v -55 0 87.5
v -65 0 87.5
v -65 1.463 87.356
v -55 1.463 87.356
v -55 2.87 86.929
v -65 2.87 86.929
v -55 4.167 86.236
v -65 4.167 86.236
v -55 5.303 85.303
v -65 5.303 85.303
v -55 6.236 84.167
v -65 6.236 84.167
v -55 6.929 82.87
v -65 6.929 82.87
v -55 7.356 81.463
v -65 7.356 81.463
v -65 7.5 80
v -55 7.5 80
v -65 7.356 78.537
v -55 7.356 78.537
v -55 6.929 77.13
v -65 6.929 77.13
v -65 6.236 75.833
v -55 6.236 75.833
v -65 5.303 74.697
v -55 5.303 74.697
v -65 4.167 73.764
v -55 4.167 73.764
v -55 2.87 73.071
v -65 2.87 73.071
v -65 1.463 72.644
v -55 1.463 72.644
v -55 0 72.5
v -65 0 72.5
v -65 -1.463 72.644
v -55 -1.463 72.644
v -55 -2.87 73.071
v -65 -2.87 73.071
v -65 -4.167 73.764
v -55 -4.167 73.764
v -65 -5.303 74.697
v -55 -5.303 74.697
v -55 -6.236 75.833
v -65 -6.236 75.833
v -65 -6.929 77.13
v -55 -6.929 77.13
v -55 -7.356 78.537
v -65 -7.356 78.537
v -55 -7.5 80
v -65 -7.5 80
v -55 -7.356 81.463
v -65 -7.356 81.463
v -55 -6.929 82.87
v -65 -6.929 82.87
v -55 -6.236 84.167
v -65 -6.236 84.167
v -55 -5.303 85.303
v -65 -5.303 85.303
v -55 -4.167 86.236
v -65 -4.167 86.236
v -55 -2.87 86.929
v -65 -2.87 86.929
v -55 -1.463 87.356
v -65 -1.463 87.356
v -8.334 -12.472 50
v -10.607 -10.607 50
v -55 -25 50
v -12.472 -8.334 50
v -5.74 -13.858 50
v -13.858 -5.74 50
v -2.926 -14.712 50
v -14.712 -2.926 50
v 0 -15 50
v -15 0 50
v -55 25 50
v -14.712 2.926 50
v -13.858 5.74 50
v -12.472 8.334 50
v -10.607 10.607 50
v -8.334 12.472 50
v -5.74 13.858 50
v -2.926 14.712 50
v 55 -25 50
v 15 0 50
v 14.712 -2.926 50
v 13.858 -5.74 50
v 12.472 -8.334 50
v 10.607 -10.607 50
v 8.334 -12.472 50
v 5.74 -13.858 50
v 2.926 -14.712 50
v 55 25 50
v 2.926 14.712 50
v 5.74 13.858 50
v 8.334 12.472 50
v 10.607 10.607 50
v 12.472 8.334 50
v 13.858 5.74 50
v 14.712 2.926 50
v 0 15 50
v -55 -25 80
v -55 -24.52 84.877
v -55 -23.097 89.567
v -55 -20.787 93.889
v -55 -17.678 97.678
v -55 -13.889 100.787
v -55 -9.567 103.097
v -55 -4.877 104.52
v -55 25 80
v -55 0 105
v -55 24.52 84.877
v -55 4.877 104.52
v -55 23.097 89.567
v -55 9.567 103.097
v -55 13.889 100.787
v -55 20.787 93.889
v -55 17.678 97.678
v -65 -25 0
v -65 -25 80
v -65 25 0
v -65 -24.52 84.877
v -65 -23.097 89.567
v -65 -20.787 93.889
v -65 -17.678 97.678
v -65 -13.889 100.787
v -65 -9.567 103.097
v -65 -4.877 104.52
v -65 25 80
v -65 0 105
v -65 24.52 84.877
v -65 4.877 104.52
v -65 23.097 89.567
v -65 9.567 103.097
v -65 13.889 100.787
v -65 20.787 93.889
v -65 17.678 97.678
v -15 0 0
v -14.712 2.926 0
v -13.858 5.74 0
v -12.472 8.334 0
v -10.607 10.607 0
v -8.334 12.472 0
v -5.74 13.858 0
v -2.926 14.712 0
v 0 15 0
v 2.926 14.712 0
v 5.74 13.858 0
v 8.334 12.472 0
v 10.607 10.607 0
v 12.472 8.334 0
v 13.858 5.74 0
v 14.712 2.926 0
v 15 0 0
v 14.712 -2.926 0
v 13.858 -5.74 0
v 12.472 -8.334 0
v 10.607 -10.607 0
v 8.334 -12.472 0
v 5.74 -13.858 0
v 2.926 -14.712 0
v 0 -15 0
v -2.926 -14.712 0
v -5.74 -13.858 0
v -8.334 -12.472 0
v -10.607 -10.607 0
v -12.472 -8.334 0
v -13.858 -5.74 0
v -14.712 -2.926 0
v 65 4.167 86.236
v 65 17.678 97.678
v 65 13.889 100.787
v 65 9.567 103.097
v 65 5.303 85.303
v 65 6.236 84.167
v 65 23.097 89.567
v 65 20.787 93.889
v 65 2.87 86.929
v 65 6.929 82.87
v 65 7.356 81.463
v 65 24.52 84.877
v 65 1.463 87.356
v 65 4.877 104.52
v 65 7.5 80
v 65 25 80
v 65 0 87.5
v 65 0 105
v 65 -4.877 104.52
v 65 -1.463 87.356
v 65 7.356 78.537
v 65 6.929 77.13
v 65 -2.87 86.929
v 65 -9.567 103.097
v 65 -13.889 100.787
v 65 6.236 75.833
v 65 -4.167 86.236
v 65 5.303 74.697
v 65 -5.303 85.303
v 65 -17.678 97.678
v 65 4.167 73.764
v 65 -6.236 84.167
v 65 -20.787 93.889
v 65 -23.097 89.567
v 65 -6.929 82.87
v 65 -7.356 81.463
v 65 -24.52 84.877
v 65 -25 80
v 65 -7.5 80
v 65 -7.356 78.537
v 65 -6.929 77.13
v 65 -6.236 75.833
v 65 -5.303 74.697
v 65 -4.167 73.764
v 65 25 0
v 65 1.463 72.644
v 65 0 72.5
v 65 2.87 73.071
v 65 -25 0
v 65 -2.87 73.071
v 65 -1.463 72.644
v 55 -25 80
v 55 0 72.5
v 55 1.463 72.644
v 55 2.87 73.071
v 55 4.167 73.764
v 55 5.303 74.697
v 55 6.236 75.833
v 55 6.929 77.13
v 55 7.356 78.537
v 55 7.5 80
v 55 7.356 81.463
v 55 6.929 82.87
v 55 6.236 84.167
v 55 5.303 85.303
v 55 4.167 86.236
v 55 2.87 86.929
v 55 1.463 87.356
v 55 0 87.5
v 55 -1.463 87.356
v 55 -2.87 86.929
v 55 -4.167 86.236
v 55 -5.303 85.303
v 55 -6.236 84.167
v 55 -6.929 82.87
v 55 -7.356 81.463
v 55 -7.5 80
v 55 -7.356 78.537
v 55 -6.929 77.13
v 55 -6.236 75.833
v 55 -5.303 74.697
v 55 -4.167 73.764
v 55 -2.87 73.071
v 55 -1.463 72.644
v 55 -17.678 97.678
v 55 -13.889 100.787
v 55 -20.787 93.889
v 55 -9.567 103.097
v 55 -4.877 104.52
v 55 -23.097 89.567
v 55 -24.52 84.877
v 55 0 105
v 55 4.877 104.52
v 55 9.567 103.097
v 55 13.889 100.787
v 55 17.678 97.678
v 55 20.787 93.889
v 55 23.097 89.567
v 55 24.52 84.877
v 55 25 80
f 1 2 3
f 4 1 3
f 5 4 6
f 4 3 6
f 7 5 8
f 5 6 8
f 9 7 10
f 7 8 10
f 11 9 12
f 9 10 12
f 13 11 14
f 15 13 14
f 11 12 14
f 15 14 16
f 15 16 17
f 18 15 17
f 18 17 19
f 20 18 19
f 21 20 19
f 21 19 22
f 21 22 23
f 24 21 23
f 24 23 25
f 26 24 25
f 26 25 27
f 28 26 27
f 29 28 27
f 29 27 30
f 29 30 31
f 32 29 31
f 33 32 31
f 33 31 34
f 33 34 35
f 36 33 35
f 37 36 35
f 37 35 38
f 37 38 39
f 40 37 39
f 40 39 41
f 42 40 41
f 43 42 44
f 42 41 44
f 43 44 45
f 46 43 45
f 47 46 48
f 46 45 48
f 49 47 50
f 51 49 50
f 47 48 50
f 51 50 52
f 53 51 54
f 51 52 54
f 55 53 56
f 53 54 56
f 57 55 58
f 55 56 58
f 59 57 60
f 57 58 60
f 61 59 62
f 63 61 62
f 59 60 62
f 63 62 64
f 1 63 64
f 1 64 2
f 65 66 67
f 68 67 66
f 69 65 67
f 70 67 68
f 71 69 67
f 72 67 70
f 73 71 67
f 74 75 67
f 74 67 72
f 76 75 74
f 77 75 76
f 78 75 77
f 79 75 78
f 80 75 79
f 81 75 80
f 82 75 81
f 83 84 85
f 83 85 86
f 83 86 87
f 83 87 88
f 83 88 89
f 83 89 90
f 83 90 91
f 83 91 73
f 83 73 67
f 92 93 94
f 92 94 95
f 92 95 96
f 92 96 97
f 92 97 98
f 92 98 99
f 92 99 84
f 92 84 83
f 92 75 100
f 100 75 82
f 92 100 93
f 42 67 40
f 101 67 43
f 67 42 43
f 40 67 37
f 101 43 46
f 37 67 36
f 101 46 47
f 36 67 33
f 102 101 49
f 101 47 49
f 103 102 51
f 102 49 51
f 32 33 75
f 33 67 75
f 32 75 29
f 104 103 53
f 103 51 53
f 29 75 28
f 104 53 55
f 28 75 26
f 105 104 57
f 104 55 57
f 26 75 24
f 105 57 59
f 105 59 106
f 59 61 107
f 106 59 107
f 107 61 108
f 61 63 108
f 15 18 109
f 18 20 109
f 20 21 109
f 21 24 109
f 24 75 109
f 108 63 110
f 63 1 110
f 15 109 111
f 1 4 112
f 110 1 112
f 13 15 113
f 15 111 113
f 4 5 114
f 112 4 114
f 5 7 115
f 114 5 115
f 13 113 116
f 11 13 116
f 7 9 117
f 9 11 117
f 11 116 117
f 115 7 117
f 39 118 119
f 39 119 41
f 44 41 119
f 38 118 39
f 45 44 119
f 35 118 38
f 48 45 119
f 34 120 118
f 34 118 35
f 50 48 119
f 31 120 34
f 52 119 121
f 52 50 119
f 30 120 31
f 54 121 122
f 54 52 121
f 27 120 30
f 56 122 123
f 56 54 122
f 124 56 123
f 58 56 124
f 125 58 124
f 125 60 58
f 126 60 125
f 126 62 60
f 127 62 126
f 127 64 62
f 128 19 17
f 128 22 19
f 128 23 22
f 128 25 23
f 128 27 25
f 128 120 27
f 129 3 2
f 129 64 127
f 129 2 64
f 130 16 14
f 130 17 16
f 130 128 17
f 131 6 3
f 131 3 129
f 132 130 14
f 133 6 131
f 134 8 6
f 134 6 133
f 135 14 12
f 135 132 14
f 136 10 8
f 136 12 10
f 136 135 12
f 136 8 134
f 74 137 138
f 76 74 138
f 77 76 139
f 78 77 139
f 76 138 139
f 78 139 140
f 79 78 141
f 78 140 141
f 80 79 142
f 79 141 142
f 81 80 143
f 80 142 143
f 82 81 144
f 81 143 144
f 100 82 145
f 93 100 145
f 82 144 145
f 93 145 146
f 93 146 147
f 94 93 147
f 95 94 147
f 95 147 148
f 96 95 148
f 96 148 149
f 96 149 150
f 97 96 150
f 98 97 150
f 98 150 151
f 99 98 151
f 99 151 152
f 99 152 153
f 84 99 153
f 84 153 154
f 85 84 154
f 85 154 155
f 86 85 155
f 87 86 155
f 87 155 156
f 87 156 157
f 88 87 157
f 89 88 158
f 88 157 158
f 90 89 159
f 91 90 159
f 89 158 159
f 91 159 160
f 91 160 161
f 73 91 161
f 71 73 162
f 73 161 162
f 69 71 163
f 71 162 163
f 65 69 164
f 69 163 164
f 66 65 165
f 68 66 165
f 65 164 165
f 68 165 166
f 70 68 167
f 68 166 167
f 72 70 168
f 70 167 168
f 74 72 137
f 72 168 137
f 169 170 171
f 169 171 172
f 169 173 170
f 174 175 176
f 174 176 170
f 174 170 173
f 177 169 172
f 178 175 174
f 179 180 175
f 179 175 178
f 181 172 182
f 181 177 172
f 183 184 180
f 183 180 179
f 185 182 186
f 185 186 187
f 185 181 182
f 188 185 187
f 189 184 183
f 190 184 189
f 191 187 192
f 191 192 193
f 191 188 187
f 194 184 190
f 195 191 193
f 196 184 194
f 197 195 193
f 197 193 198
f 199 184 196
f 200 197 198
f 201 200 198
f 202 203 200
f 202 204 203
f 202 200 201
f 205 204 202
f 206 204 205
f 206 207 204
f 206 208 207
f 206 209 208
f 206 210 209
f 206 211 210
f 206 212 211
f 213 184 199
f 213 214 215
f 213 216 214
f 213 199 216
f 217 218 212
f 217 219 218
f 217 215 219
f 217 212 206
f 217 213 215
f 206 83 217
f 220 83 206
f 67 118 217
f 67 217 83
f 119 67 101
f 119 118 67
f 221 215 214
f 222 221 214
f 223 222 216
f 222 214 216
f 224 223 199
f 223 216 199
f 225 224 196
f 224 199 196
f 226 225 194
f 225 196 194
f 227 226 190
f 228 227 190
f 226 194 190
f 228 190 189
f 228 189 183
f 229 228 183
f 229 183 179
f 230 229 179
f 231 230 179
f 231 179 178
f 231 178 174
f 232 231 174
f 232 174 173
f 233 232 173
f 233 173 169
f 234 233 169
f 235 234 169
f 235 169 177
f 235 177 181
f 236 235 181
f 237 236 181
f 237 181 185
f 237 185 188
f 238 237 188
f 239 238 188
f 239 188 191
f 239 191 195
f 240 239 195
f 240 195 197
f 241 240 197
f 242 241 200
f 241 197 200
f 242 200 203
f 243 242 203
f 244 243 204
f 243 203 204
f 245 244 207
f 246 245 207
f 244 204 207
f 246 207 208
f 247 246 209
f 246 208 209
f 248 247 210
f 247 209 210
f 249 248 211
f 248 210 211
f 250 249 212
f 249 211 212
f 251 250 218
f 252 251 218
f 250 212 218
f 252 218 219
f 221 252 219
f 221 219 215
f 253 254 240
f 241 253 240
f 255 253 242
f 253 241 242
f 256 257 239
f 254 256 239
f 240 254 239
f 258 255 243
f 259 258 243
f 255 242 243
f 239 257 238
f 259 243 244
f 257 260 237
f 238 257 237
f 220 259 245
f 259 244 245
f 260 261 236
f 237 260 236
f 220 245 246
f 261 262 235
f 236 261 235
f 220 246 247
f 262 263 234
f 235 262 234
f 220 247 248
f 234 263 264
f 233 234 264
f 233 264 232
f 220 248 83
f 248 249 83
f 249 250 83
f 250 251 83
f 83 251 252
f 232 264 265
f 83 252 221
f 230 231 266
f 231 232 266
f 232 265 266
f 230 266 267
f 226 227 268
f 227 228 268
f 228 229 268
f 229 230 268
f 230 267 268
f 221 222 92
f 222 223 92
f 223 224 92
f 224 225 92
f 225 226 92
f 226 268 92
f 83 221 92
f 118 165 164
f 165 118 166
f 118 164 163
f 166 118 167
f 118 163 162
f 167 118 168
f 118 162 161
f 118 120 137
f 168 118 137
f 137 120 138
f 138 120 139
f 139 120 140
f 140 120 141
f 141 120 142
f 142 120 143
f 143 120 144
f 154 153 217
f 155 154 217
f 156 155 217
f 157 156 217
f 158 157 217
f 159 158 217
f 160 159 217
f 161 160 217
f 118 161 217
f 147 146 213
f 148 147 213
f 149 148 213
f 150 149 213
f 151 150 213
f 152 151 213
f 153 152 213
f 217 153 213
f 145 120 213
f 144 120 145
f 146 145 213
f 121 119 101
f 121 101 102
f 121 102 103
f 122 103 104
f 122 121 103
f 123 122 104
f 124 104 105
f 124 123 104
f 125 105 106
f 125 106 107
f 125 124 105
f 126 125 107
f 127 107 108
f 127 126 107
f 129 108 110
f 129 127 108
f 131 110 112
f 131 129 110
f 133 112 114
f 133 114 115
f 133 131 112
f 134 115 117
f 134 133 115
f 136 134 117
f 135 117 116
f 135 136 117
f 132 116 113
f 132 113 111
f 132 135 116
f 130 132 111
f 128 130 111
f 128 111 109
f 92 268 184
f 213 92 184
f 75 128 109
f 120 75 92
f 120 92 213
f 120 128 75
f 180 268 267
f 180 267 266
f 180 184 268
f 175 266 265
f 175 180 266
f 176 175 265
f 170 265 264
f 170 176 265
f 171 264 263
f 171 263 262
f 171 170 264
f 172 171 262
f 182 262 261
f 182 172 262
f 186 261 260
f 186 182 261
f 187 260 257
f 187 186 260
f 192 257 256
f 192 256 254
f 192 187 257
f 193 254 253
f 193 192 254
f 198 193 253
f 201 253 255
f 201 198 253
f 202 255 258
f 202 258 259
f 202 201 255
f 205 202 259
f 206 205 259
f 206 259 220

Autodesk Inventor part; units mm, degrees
ref_plane "YZ Plane" through (0, 0, 0) normal (1, 0, 0) x (0, 1, 0)
ref_plane "XZ Plane" through (0, 0, 0) normal (0, 1, 0) x (-1, 0, 0)
ref_plane "XY Plane" through (0, 0, 0) normal (0, 0, 1) x (1, 0, 0)
sketch "Boceto1" plane through (0, 0, 0) normal (0, 0, 1) x (1, 0, 0)
  line L0 (65, -25) -> (-65, -25)
  line L1 (-65, -25) -> (-65, 25)
  line L2 (-65, 25) -> (65, 25)
  line L3 (65, 25) -> (65, -25)
  line L4 (65, -25) -> (-65, 25) construction
  line L5 (-65, -25) -> (65, 25) construction
  point P0 (0, 0)
  dimension "d0" = 130
  dimension "d1" = 50
extrude "Extrusión1" add sketch "Boceto1" along normal blind 50
sketch "Boceto2" plane through (65, -25, 0) normal (1, 0, 0) x (0, 0, -1)
  line L0 (-50, 0) -> (-80, 0)
  line L1 (-50, 0) -> (-50, 50) projected
  line L2 (-50, 50) -> (-80, 50)
  arc A0 (-80, 50) -> (-80, 0) centre (-80, 25) ccw
  circle A1 centre (-80, 25) radius 7.5
  point P0 (0, 25)
  dimension "d4" = 30
  dimension "d5" = 30
  dimension "d6" = 15
extrude "Extrusión2" add sketch "Boceto2" against normal blind 10
sketch "Boceto3" plane through (-65, -25, 0) normal (-1, 0, 0) x (0, 0, 1)
  circle A0 centre (80, 25) radius 7.5 projected
  arc A1 (80, 0) -> (80, 50) centre (80, 25) ccw projected
  line L0 (80, 50) -> (50, 50) projected
  line L1 (50, 50) -> (50, 0) projected
  line L2 (50, 0) -> (80, 0) projected
  point P0 (0, 25)
extrude "Extrusión3" add sketch "Boceto3" against normal blind 10
sketch "Boceto4" plane through (0, 0, 0) normal (0, 0, -1) x (-1, 0, 0)
  circle A0 centre (0, 0) radius 15
  dimension "d11" = 30
extrude "Extrusión4" cut sketch "Boceto4" against normal up to next
properties part number "Muñeca"
